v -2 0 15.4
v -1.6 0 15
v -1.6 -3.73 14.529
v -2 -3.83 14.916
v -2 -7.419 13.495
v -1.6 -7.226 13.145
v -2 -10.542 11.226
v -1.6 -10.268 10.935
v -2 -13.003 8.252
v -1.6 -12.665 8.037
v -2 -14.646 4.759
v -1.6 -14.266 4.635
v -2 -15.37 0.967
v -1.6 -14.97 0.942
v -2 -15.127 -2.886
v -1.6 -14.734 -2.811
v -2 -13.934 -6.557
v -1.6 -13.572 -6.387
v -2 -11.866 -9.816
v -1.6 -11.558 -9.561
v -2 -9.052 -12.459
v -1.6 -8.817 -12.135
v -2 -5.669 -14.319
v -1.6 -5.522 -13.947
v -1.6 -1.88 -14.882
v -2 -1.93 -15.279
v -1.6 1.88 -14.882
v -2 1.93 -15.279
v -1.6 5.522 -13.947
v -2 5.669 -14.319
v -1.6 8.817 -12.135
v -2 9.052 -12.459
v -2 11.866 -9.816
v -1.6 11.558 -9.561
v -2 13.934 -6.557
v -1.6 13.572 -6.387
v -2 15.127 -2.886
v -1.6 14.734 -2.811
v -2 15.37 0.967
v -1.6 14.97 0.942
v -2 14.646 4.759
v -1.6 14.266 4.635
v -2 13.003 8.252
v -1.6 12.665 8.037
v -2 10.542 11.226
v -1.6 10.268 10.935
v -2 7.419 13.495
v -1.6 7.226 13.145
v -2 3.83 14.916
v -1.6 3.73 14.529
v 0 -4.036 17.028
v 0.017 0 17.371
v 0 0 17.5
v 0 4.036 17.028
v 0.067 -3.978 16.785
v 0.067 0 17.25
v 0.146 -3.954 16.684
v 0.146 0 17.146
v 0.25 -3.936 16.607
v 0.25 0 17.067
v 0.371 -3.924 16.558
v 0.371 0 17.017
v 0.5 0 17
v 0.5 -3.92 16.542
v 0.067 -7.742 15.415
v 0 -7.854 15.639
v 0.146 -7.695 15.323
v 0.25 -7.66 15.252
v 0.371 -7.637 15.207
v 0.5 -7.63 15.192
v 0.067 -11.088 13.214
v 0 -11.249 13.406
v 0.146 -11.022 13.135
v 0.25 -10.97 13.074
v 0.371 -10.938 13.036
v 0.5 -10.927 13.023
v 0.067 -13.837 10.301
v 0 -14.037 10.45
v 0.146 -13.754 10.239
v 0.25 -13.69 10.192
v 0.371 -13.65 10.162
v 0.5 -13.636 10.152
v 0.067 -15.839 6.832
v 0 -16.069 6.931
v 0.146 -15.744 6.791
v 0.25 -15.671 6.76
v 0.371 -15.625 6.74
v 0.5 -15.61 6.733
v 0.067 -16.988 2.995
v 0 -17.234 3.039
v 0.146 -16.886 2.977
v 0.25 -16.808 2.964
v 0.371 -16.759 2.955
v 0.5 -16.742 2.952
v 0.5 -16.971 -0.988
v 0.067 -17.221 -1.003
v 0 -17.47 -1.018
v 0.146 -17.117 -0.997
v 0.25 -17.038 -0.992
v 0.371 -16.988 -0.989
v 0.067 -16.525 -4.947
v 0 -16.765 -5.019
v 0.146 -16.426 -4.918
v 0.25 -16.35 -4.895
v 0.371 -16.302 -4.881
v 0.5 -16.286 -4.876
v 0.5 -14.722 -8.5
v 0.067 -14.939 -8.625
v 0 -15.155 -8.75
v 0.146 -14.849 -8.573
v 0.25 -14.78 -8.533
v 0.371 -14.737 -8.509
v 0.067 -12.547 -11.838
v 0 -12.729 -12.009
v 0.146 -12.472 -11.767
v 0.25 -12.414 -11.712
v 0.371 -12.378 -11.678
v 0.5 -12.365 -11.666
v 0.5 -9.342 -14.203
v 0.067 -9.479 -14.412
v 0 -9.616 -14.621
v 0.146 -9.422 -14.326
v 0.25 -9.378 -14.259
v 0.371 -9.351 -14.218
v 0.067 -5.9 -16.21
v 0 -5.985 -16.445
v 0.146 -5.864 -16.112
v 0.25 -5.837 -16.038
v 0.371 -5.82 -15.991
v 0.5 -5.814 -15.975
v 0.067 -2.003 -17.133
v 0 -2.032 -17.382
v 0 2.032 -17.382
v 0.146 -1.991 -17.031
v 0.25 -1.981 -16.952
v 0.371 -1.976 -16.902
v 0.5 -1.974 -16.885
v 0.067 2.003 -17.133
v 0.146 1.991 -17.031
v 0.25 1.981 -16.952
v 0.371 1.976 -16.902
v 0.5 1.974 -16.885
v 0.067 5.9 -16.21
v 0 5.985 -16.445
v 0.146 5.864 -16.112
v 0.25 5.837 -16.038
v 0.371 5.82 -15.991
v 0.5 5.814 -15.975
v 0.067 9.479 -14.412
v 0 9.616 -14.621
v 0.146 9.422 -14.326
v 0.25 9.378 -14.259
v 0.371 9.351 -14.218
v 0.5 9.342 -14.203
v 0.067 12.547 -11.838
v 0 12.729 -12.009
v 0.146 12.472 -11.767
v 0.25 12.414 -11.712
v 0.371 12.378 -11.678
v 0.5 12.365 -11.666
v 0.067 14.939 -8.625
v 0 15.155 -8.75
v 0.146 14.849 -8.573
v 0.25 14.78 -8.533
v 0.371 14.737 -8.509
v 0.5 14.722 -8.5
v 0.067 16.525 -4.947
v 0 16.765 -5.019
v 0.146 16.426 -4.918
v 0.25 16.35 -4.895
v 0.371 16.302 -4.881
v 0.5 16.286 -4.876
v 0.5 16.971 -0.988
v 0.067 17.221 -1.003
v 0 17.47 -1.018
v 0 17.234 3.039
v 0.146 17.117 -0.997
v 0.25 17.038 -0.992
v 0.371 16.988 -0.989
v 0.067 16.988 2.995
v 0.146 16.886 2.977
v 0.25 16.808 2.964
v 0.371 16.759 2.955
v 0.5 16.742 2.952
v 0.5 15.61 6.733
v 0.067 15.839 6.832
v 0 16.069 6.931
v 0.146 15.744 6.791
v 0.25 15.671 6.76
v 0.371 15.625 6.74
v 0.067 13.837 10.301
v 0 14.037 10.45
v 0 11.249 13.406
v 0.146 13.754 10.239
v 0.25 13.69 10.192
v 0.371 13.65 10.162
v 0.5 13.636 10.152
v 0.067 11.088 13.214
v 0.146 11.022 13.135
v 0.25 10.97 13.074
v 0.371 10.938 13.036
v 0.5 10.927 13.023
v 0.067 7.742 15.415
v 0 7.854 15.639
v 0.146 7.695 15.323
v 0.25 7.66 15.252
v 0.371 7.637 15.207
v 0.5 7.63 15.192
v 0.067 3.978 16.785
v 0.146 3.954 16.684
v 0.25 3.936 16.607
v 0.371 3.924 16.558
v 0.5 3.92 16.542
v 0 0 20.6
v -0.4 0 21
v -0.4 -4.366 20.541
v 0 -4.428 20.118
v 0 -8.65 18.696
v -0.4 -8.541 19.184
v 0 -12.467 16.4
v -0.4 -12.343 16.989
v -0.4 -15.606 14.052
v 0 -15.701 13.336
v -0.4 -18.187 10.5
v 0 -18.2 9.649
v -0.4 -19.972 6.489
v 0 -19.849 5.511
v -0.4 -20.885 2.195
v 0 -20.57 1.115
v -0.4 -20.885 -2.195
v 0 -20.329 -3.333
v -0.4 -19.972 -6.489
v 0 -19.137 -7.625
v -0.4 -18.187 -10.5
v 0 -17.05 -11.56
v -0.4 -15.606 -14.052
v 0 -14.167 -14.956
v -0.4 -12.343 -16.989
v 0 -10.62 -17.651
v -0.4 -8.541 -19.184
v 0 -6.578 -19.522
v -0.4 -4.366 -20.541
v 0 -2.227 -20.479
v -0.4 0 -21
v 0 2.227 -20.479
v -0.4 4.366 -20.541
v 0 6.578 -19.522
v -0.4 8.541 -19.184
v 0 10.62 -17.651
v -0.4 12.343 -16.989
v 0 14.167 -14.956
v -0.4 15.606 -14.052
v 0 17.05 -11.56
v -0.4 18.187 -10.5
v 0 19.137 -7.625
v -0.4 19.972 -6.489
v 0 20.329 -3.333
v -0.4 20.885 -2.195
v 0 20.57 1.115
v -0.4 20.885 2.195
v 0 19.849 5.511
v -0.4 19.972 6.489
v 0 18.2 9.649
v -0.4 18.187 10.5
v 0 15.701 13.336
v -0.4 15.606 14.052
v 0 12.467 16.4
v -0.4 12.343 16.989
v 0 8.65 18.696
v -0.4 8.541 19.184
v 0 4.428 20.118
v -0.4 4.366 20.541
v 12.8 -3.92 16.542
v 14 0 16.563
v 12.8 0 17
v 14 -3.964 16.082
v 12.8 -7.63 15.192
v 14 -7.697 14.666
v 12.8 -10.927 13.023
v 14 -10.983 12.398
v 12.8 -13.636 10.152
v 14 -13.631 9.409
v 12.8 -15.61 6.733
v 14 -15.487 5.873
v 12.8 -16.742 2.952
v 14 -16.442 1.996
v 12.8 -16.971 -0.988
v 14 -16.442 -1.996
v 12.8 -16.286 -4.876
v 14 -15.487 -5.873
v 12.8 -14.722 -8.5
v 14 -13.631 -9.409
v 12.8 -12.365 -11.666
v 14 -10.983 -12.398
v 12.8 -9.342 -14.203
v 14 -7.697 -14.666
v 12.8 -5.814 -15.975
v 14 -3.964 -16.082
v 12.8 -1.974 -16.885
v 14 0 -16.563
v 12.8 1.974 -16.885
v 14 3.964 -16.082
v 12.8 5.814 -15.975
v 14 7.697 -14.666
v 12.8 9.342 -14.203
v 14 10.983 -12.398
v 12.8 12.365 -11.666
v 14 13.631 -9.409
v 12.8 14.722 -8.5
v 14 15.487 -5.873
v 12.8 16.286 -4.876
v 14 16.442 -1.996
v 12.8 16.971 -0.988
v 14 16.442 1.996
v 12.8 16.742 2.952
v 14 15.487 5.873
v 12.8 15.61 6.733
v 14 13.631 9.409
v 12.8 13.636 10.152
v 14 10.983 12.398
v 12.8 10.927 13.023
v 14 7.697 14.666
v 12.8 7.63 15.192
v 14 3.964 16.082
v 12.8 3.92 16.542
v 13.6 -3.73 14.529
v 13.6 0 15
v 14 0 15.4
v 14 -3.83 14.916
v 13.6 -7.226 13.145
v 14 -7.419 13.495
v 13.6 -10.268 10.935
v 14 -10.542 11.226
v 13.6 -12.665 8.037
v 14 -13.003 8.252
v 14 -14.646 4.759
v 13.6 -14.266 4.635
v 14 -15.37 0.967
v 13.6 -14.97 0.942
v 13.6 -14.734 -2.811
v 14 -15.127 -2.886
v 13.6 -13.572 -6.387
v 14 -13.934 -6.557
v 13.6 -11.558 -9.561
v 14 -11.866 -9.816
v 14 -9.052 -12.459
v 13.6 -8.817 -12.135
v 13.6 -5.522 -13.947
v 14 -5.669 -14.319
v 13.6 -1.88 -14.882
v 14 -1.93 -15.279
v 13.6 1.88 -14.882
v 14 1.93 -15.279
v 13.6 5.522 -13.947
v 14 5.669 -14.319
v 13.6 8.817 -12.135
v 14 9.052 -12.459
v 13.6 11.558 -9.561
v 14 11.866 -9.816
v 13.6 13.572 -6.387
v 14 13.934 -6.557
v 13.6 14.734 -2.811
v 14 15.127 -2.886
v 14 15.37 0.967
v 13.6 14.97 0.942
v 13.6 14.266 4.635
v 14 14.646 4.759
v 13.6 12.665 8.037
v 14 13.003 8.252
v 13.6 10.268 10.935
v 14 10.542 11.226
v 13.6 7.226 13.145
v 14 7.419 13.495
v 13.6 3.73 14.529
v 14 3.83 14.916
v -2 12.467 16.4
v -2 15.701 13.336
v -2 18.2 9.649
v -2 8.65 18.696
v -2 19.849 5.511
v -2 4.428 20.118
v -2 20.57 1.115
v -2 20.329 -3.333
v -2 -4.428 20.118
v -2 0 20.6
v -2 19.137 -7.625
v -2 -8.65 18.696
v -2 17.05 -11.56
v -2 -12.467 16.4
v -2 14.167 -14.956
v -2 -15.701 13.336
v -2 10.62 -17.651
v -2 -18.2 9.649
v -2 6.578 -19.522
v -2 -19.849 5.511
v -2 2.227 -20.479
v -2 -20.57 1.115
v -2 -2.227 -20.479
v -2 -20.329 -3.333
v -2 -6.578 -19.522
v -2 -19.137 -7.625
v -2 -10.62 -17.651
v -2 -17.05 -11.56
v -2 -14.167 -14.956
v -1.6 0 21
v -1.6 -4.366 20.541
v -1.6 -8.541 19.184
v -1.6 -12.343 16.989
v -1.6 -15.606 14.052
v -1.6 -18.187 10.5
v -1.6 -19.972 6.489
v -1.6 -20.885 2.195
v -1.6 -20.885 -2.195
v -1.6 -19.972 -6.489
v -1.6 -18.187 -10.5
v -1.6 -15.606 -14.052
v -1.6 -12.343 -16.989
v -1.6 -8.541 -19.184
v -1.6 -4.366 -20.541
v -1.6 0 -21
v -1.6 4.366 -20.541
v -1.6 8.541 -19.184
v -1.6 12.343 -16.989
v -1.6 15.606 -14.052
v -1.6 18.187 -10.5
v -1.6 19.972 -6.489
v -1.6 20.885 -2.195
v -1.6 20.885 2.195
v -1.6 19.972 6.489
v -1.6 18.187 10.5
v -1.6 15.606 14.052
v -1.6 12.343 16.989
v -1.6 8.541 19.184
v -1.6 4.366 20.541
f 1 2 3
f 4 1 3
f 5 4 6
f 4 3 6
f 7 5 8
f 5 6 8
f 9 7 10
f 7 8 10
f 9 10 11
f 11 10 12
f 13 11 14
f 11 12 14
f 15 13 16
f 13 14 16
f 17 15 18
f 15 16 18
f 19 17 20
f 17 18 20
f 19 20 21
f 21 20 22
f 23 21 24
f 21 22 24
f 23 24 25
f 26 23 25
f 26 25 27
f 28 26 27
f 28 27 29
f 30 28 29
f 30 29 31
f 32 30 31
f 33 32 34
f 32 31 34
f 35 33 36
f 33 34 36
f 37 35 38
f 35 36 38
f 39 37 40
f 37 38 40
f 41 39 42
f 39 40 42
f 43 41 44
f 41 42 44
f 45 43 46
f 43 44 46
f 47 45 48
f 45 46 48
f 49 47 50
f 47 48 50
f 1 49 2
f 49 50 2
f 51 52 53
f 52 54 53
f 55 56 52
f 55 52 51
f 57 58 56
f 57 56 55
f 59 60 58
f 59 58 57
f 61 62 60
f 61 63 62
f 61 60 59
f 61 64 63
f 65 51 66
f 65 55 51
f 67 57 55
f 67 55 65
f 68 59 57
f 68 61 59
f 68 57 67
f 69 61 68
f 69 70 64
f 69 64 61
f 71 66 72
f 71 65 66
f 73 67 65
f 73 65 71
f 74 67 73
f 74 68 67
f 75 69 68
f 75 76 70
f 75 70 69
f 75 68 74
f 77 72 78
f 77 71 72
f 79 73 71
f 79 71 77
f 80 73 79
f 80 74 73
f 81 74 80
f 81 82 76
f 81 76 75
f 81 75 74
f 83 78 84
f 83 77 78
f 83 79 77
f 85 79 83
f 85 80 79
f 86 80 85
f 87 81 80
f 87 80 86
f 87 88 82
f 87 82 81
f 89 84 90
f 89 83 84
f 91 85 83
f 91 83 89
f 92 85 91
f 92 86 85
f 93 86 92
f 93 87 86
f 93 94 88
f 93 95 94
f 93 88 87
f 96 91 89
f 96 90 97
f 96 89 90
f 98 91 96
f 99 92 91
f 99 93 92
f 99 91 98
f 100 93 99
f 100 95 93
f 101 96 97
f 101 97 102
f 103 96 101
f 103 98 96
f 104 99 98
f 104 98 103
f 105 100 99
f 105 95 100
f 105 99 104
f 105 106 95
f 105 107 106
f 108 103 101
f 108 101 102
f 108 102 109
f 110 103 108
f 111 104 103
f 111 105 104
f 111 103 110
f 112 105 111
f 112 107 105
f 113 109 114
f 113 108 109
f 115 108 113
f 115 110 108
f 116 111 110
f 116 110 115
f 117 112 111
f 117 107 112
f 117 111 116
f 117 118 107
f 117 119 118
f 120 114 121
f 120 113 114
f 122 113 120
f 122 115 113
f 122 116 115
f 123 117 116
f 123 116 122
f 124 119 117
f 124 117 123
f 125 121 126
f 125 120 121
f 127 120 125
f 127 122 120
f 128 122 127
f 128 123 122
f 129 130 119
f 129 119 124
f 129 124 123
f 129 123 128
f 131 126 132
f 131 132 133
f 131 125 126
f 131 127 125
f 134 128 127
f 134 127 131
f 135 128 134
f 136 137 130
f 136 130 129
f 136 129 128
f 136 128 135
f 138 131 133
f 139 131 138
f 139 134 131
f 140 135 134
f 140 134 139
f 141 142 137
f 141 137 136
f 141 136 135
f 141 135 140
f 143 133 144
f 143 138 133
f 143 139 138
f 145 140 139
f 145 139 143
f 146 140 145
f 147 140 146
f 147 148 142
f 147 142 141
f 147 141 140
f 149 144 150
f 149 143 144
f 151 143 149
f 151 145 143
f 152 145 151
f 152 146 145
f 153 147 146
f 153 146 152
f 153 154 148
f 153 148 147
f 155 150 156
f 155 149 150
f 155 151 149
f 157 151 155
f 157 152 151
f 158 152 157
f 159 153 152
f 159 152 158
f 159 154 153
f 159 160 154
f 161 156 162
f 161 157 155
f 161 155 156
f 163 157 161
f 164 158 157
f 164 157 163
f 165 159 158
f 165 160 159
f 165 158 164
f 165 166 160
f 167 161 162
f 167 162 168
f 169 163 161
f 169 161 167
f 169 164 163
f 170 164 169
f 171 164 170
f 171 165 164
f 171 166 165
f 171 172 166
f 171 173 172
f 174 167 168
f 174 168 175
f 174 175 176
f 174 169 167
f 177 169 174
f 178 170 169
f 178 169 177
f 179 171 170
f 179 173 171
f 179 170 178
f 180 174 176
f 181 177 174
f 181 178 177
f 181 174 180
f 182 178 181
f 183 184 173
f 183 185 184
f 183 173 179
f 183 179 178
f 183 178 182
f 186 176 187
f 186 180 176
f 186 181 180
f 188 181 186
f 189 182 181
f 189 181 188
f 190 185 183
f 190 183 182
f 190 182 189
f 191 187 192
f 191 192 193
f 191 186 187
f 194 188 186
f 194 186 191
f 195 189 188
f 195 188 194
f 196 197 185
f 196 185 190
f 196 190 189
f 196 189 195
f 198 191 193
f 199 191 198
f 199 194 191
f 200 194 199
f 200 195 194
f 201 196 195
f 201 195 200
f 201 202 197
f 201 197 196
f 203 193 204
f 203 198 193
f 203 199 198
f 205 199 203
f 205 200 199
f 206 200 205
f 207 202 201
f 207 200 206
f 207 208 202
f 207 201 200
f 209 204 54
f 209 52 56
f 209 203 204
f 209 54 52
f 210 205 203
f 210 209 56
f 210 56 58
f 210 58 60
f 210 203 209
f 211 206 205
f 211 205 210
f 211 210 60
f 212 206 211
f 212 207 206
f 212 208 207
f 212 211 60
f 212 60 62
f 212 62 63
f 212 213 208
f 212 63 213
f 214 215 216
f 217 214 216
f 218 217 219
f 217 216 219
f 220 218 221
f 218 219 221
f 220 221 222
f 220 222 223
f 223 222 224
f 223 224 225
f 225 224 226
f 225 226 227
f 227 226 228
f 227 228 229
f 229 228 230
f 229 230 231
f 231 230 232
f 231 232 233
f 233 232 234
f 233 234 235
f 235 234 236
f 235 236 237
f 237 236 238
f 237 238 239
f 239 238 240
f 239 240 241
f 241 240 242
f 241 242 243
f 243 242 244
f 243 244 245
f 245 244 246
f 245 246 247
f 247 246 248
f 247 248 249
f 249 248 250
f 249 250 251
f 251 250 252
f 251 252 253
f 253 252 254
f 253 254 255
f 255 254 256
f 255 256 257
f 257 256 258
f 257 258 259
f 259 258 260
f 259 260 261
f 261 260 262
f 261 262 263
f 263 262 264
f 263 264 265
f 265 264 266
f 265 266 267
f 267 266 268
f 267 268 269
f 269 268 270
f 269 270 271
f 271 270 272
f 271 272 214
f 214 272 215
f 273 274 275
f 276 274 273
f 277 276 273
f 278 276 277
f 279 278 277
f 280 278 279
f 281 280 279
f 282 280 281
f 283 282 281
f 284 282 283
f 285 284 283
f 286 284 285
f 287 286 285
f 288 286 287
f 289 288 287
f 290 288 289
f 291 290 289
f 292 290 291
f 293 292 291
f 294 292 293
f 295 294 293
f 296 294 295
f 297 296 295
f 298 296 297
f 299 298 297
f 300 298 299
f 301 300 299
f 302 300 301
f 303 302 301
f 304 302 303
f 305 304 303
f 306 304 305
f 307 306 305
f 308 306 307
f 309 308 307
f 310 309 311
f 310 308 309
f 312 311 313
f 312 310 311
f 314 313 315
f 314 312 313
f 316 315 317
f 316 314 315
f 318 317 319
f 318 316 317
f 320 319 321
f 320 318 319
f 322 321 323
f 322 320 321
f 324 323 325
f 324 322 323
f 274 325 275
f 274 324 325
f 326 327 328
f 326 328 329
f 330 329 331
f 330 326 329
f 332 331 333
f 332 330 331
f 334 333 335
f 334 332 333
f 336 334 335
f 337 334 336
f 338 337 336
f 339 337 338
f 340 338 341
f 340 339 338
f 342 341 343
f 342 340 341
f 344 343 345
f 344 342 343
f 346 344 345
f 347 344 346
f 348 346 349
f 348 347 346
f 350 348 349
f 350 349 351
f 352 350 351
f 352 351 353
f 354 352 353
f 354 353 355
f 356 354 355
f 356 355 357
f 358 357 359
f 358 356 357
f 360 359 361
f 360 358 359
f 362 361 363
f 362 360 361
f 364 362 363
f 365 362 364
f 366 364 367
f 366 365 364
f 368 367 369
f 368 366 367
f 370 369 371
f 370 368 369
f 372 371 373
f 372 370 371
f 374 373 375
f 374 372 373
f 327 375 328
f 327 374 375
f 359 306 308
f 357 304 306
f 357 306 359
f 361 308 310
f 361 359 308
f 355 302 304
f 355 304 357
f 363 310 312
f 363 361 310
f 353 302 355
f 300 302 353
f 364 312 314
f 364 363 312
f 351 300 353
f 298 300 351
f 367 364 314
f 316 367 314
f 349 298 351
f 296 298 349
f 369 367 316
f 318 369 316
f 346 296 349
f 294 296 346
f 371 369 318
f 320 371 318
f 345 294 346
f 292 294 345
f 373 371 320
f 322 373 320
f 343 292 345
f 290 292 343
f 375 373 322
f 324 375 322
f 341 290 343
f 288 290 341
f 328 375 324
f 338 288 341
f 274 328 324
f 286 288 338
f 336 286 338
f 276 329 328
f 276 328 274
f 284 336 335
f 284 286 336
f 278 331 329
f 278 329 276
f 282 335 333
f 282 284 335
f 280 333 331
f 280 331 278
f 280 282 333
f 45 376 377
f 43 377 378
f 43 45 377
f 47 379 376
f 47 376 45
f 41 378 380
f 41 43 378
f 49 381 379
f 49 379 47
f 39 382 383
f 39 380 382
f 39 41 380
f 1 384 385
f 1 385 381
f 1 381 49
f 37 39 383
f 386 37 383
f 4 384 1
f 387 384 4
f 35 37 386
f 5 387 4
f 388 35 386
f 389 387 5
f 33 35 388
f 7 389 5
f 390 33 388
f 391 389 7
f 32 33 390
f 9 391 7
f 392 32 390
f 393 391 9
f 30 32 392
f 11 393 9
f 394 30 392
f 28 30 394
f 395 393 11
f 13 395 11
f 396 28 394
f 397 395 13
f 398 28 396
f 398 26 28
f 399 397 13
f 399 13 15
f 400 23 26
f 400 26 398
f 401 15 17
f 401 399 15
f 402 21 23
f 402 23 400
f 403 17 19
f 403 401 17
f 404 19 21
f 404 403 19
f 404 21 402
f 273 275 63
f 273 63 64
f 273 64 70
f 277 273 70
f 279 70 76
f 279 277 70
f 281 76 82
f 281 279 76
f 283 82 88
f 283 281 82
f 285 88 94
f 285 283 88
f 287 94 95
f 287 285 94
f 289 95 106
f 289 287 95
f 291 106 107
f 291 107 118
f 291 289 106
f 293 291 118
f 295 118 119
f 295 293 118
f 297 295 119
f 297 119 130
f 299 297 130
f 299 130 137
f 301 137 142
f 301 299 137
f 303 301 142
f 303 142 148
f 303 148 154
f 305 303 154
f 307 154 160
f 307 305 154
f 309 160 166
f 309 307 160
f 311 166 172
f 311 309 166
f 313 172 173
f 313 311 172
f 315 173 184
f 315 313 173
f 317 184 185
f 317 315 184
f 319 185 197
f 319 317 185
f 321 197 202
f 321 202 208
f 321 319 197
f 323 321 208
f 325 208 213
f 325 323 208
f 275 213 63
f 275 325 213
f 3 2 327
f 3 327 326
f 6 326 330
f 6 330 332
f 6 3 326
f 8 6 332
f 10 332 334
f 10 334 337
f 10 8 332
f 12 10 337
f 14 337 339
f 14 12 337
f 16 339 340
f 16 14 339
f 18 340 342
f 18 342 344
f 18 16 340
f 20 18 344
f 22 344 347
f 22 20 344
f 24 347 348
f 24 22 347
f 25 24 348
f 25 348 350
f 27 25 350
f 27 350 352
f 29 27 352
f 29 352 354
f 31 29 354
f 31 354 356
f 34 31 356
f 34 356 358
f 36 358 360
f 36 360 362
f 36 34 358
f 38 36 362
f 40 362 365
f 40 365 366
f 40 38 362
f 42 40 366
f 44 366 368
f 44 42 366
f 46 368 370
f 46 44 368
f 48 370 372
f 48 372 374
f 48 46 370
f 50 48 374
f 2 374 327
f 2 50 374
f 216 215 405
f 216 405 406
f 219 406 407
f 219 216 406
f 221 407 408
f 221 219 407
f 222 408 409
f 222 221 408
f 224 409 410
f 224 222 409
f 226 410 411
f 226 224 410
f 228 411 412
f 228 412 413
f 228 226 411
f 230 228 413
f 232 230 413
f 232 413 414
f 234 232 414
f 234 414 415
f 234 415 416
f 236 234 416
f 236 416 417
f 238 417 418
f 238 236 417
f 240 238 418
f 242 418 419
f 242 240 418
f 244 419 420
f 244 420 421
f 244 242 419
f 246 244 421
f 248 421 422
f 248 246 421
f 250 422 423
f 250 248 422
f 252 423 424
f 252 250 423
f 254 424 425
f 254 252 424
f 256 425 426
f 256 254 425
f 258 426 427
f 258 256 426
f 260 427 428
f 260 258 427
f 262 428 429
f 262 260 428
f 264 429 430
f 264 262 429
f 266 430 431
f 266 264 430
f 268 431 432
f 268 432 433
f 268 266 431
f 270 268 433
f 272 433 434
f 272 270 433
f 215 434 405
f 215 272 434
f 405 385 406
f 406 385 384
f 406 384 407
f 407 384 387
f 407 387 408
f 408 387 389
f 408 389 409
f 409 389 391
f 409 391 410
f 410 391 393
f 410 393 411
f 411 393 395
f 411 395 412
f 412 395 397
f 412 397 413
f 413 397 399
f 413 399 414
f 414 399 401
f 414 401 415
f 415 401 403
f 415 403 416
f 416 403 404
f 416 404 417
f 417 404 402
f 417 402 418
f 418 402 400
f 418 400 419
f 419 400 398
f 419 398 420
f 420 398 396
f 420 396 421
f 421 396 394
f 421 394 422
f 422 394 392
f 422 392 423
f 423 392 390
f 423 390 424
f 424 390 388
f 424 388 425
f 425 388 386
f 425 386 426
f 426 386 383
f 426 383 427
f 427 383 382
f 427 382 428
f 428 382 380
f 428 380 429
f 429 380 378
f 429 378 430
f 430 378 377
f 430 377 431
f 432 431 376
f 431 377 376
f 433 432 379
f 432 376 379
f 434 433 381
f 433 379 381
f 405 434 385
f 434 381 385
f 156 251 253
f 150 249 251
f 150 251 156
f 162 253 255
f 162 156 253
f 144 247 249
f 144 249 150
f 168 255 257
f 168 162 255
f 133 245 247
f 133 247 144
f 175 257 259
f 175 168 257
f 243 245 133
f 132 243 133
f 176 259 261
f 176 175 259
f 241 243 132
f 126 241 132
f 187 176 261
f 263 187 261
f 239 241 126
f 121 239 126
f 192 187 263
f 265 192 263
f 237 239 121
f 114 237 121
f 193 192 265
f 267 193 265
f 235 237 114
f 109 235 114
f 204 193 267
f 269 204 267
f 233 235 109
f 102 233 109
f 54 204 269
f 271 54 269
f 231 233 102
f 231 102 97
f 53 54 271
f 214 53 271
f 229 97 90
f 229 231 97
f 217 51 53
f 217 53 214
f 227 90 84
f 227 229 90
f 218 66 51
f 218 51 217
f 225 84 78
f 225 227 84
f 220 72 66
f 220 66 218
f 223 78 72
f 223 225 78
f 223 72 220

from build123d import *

# Parameters (mm, degrees)
CONG_2_R         = 0.5
CHANFREIN1_SIZE  = 0.4
CHANFREIN3_SIZE  = 1.2
CHANFREIN3_SIZE2 = 0.436764281


with BuildPart() as part:
    # Esquisse1 → Base-Révolution (revolve)
    with BuildSketch(Plane.XY, mode=Mode.PRIVATE) as base_r_volution_sk:
        Polygon((-2, 15), (-2, 21), (0, 21), (0, 17), (14, 17), (14, 15), align=None)
    revolve(base_r_volution_sk.sketch.rotate(Axis((-5.312682662, 0, 0), (1, 0, 0)), 90), axis=Axis((-5.312682662, 0, 0), (1, 0, 0)))

    # Congé2
    cong_2_edges = [part.edges().sort_by_distance(p)[0] for p in [
        (0, 0, -17),
    ]]
    fillet(cong_2_edges, radius=CONG_2_R)

    # Chanfrein1
    chanfrein1_edges = [part.edges().sort_by_distance(p)[0] for p in [
        (0, 0, -21),
        (-2, 0, -21),
        (-2, 0, -15),
        (14, 0, -15),
    ]]
    chamfer(chanfrein1_edges, length=CHANFREIN1_SIZE)

    # Chanfrein3
    chanfrein3_edges = [part.edges().sort_by_distance(p)[0] for p in [
        (14, 0, -17),
    ]]
    chanfrein3_side = [part.faces().sort_by_distance(p)[0] for p in [
        (7.25, 0, -17),
    ]]
    chamfer(chanfrein3_edges, length=CHANFREIN3_SIZE, length2=CHANFREIN3_SIZE2, reference=chanfrein3_side[0])


solid = part.part
